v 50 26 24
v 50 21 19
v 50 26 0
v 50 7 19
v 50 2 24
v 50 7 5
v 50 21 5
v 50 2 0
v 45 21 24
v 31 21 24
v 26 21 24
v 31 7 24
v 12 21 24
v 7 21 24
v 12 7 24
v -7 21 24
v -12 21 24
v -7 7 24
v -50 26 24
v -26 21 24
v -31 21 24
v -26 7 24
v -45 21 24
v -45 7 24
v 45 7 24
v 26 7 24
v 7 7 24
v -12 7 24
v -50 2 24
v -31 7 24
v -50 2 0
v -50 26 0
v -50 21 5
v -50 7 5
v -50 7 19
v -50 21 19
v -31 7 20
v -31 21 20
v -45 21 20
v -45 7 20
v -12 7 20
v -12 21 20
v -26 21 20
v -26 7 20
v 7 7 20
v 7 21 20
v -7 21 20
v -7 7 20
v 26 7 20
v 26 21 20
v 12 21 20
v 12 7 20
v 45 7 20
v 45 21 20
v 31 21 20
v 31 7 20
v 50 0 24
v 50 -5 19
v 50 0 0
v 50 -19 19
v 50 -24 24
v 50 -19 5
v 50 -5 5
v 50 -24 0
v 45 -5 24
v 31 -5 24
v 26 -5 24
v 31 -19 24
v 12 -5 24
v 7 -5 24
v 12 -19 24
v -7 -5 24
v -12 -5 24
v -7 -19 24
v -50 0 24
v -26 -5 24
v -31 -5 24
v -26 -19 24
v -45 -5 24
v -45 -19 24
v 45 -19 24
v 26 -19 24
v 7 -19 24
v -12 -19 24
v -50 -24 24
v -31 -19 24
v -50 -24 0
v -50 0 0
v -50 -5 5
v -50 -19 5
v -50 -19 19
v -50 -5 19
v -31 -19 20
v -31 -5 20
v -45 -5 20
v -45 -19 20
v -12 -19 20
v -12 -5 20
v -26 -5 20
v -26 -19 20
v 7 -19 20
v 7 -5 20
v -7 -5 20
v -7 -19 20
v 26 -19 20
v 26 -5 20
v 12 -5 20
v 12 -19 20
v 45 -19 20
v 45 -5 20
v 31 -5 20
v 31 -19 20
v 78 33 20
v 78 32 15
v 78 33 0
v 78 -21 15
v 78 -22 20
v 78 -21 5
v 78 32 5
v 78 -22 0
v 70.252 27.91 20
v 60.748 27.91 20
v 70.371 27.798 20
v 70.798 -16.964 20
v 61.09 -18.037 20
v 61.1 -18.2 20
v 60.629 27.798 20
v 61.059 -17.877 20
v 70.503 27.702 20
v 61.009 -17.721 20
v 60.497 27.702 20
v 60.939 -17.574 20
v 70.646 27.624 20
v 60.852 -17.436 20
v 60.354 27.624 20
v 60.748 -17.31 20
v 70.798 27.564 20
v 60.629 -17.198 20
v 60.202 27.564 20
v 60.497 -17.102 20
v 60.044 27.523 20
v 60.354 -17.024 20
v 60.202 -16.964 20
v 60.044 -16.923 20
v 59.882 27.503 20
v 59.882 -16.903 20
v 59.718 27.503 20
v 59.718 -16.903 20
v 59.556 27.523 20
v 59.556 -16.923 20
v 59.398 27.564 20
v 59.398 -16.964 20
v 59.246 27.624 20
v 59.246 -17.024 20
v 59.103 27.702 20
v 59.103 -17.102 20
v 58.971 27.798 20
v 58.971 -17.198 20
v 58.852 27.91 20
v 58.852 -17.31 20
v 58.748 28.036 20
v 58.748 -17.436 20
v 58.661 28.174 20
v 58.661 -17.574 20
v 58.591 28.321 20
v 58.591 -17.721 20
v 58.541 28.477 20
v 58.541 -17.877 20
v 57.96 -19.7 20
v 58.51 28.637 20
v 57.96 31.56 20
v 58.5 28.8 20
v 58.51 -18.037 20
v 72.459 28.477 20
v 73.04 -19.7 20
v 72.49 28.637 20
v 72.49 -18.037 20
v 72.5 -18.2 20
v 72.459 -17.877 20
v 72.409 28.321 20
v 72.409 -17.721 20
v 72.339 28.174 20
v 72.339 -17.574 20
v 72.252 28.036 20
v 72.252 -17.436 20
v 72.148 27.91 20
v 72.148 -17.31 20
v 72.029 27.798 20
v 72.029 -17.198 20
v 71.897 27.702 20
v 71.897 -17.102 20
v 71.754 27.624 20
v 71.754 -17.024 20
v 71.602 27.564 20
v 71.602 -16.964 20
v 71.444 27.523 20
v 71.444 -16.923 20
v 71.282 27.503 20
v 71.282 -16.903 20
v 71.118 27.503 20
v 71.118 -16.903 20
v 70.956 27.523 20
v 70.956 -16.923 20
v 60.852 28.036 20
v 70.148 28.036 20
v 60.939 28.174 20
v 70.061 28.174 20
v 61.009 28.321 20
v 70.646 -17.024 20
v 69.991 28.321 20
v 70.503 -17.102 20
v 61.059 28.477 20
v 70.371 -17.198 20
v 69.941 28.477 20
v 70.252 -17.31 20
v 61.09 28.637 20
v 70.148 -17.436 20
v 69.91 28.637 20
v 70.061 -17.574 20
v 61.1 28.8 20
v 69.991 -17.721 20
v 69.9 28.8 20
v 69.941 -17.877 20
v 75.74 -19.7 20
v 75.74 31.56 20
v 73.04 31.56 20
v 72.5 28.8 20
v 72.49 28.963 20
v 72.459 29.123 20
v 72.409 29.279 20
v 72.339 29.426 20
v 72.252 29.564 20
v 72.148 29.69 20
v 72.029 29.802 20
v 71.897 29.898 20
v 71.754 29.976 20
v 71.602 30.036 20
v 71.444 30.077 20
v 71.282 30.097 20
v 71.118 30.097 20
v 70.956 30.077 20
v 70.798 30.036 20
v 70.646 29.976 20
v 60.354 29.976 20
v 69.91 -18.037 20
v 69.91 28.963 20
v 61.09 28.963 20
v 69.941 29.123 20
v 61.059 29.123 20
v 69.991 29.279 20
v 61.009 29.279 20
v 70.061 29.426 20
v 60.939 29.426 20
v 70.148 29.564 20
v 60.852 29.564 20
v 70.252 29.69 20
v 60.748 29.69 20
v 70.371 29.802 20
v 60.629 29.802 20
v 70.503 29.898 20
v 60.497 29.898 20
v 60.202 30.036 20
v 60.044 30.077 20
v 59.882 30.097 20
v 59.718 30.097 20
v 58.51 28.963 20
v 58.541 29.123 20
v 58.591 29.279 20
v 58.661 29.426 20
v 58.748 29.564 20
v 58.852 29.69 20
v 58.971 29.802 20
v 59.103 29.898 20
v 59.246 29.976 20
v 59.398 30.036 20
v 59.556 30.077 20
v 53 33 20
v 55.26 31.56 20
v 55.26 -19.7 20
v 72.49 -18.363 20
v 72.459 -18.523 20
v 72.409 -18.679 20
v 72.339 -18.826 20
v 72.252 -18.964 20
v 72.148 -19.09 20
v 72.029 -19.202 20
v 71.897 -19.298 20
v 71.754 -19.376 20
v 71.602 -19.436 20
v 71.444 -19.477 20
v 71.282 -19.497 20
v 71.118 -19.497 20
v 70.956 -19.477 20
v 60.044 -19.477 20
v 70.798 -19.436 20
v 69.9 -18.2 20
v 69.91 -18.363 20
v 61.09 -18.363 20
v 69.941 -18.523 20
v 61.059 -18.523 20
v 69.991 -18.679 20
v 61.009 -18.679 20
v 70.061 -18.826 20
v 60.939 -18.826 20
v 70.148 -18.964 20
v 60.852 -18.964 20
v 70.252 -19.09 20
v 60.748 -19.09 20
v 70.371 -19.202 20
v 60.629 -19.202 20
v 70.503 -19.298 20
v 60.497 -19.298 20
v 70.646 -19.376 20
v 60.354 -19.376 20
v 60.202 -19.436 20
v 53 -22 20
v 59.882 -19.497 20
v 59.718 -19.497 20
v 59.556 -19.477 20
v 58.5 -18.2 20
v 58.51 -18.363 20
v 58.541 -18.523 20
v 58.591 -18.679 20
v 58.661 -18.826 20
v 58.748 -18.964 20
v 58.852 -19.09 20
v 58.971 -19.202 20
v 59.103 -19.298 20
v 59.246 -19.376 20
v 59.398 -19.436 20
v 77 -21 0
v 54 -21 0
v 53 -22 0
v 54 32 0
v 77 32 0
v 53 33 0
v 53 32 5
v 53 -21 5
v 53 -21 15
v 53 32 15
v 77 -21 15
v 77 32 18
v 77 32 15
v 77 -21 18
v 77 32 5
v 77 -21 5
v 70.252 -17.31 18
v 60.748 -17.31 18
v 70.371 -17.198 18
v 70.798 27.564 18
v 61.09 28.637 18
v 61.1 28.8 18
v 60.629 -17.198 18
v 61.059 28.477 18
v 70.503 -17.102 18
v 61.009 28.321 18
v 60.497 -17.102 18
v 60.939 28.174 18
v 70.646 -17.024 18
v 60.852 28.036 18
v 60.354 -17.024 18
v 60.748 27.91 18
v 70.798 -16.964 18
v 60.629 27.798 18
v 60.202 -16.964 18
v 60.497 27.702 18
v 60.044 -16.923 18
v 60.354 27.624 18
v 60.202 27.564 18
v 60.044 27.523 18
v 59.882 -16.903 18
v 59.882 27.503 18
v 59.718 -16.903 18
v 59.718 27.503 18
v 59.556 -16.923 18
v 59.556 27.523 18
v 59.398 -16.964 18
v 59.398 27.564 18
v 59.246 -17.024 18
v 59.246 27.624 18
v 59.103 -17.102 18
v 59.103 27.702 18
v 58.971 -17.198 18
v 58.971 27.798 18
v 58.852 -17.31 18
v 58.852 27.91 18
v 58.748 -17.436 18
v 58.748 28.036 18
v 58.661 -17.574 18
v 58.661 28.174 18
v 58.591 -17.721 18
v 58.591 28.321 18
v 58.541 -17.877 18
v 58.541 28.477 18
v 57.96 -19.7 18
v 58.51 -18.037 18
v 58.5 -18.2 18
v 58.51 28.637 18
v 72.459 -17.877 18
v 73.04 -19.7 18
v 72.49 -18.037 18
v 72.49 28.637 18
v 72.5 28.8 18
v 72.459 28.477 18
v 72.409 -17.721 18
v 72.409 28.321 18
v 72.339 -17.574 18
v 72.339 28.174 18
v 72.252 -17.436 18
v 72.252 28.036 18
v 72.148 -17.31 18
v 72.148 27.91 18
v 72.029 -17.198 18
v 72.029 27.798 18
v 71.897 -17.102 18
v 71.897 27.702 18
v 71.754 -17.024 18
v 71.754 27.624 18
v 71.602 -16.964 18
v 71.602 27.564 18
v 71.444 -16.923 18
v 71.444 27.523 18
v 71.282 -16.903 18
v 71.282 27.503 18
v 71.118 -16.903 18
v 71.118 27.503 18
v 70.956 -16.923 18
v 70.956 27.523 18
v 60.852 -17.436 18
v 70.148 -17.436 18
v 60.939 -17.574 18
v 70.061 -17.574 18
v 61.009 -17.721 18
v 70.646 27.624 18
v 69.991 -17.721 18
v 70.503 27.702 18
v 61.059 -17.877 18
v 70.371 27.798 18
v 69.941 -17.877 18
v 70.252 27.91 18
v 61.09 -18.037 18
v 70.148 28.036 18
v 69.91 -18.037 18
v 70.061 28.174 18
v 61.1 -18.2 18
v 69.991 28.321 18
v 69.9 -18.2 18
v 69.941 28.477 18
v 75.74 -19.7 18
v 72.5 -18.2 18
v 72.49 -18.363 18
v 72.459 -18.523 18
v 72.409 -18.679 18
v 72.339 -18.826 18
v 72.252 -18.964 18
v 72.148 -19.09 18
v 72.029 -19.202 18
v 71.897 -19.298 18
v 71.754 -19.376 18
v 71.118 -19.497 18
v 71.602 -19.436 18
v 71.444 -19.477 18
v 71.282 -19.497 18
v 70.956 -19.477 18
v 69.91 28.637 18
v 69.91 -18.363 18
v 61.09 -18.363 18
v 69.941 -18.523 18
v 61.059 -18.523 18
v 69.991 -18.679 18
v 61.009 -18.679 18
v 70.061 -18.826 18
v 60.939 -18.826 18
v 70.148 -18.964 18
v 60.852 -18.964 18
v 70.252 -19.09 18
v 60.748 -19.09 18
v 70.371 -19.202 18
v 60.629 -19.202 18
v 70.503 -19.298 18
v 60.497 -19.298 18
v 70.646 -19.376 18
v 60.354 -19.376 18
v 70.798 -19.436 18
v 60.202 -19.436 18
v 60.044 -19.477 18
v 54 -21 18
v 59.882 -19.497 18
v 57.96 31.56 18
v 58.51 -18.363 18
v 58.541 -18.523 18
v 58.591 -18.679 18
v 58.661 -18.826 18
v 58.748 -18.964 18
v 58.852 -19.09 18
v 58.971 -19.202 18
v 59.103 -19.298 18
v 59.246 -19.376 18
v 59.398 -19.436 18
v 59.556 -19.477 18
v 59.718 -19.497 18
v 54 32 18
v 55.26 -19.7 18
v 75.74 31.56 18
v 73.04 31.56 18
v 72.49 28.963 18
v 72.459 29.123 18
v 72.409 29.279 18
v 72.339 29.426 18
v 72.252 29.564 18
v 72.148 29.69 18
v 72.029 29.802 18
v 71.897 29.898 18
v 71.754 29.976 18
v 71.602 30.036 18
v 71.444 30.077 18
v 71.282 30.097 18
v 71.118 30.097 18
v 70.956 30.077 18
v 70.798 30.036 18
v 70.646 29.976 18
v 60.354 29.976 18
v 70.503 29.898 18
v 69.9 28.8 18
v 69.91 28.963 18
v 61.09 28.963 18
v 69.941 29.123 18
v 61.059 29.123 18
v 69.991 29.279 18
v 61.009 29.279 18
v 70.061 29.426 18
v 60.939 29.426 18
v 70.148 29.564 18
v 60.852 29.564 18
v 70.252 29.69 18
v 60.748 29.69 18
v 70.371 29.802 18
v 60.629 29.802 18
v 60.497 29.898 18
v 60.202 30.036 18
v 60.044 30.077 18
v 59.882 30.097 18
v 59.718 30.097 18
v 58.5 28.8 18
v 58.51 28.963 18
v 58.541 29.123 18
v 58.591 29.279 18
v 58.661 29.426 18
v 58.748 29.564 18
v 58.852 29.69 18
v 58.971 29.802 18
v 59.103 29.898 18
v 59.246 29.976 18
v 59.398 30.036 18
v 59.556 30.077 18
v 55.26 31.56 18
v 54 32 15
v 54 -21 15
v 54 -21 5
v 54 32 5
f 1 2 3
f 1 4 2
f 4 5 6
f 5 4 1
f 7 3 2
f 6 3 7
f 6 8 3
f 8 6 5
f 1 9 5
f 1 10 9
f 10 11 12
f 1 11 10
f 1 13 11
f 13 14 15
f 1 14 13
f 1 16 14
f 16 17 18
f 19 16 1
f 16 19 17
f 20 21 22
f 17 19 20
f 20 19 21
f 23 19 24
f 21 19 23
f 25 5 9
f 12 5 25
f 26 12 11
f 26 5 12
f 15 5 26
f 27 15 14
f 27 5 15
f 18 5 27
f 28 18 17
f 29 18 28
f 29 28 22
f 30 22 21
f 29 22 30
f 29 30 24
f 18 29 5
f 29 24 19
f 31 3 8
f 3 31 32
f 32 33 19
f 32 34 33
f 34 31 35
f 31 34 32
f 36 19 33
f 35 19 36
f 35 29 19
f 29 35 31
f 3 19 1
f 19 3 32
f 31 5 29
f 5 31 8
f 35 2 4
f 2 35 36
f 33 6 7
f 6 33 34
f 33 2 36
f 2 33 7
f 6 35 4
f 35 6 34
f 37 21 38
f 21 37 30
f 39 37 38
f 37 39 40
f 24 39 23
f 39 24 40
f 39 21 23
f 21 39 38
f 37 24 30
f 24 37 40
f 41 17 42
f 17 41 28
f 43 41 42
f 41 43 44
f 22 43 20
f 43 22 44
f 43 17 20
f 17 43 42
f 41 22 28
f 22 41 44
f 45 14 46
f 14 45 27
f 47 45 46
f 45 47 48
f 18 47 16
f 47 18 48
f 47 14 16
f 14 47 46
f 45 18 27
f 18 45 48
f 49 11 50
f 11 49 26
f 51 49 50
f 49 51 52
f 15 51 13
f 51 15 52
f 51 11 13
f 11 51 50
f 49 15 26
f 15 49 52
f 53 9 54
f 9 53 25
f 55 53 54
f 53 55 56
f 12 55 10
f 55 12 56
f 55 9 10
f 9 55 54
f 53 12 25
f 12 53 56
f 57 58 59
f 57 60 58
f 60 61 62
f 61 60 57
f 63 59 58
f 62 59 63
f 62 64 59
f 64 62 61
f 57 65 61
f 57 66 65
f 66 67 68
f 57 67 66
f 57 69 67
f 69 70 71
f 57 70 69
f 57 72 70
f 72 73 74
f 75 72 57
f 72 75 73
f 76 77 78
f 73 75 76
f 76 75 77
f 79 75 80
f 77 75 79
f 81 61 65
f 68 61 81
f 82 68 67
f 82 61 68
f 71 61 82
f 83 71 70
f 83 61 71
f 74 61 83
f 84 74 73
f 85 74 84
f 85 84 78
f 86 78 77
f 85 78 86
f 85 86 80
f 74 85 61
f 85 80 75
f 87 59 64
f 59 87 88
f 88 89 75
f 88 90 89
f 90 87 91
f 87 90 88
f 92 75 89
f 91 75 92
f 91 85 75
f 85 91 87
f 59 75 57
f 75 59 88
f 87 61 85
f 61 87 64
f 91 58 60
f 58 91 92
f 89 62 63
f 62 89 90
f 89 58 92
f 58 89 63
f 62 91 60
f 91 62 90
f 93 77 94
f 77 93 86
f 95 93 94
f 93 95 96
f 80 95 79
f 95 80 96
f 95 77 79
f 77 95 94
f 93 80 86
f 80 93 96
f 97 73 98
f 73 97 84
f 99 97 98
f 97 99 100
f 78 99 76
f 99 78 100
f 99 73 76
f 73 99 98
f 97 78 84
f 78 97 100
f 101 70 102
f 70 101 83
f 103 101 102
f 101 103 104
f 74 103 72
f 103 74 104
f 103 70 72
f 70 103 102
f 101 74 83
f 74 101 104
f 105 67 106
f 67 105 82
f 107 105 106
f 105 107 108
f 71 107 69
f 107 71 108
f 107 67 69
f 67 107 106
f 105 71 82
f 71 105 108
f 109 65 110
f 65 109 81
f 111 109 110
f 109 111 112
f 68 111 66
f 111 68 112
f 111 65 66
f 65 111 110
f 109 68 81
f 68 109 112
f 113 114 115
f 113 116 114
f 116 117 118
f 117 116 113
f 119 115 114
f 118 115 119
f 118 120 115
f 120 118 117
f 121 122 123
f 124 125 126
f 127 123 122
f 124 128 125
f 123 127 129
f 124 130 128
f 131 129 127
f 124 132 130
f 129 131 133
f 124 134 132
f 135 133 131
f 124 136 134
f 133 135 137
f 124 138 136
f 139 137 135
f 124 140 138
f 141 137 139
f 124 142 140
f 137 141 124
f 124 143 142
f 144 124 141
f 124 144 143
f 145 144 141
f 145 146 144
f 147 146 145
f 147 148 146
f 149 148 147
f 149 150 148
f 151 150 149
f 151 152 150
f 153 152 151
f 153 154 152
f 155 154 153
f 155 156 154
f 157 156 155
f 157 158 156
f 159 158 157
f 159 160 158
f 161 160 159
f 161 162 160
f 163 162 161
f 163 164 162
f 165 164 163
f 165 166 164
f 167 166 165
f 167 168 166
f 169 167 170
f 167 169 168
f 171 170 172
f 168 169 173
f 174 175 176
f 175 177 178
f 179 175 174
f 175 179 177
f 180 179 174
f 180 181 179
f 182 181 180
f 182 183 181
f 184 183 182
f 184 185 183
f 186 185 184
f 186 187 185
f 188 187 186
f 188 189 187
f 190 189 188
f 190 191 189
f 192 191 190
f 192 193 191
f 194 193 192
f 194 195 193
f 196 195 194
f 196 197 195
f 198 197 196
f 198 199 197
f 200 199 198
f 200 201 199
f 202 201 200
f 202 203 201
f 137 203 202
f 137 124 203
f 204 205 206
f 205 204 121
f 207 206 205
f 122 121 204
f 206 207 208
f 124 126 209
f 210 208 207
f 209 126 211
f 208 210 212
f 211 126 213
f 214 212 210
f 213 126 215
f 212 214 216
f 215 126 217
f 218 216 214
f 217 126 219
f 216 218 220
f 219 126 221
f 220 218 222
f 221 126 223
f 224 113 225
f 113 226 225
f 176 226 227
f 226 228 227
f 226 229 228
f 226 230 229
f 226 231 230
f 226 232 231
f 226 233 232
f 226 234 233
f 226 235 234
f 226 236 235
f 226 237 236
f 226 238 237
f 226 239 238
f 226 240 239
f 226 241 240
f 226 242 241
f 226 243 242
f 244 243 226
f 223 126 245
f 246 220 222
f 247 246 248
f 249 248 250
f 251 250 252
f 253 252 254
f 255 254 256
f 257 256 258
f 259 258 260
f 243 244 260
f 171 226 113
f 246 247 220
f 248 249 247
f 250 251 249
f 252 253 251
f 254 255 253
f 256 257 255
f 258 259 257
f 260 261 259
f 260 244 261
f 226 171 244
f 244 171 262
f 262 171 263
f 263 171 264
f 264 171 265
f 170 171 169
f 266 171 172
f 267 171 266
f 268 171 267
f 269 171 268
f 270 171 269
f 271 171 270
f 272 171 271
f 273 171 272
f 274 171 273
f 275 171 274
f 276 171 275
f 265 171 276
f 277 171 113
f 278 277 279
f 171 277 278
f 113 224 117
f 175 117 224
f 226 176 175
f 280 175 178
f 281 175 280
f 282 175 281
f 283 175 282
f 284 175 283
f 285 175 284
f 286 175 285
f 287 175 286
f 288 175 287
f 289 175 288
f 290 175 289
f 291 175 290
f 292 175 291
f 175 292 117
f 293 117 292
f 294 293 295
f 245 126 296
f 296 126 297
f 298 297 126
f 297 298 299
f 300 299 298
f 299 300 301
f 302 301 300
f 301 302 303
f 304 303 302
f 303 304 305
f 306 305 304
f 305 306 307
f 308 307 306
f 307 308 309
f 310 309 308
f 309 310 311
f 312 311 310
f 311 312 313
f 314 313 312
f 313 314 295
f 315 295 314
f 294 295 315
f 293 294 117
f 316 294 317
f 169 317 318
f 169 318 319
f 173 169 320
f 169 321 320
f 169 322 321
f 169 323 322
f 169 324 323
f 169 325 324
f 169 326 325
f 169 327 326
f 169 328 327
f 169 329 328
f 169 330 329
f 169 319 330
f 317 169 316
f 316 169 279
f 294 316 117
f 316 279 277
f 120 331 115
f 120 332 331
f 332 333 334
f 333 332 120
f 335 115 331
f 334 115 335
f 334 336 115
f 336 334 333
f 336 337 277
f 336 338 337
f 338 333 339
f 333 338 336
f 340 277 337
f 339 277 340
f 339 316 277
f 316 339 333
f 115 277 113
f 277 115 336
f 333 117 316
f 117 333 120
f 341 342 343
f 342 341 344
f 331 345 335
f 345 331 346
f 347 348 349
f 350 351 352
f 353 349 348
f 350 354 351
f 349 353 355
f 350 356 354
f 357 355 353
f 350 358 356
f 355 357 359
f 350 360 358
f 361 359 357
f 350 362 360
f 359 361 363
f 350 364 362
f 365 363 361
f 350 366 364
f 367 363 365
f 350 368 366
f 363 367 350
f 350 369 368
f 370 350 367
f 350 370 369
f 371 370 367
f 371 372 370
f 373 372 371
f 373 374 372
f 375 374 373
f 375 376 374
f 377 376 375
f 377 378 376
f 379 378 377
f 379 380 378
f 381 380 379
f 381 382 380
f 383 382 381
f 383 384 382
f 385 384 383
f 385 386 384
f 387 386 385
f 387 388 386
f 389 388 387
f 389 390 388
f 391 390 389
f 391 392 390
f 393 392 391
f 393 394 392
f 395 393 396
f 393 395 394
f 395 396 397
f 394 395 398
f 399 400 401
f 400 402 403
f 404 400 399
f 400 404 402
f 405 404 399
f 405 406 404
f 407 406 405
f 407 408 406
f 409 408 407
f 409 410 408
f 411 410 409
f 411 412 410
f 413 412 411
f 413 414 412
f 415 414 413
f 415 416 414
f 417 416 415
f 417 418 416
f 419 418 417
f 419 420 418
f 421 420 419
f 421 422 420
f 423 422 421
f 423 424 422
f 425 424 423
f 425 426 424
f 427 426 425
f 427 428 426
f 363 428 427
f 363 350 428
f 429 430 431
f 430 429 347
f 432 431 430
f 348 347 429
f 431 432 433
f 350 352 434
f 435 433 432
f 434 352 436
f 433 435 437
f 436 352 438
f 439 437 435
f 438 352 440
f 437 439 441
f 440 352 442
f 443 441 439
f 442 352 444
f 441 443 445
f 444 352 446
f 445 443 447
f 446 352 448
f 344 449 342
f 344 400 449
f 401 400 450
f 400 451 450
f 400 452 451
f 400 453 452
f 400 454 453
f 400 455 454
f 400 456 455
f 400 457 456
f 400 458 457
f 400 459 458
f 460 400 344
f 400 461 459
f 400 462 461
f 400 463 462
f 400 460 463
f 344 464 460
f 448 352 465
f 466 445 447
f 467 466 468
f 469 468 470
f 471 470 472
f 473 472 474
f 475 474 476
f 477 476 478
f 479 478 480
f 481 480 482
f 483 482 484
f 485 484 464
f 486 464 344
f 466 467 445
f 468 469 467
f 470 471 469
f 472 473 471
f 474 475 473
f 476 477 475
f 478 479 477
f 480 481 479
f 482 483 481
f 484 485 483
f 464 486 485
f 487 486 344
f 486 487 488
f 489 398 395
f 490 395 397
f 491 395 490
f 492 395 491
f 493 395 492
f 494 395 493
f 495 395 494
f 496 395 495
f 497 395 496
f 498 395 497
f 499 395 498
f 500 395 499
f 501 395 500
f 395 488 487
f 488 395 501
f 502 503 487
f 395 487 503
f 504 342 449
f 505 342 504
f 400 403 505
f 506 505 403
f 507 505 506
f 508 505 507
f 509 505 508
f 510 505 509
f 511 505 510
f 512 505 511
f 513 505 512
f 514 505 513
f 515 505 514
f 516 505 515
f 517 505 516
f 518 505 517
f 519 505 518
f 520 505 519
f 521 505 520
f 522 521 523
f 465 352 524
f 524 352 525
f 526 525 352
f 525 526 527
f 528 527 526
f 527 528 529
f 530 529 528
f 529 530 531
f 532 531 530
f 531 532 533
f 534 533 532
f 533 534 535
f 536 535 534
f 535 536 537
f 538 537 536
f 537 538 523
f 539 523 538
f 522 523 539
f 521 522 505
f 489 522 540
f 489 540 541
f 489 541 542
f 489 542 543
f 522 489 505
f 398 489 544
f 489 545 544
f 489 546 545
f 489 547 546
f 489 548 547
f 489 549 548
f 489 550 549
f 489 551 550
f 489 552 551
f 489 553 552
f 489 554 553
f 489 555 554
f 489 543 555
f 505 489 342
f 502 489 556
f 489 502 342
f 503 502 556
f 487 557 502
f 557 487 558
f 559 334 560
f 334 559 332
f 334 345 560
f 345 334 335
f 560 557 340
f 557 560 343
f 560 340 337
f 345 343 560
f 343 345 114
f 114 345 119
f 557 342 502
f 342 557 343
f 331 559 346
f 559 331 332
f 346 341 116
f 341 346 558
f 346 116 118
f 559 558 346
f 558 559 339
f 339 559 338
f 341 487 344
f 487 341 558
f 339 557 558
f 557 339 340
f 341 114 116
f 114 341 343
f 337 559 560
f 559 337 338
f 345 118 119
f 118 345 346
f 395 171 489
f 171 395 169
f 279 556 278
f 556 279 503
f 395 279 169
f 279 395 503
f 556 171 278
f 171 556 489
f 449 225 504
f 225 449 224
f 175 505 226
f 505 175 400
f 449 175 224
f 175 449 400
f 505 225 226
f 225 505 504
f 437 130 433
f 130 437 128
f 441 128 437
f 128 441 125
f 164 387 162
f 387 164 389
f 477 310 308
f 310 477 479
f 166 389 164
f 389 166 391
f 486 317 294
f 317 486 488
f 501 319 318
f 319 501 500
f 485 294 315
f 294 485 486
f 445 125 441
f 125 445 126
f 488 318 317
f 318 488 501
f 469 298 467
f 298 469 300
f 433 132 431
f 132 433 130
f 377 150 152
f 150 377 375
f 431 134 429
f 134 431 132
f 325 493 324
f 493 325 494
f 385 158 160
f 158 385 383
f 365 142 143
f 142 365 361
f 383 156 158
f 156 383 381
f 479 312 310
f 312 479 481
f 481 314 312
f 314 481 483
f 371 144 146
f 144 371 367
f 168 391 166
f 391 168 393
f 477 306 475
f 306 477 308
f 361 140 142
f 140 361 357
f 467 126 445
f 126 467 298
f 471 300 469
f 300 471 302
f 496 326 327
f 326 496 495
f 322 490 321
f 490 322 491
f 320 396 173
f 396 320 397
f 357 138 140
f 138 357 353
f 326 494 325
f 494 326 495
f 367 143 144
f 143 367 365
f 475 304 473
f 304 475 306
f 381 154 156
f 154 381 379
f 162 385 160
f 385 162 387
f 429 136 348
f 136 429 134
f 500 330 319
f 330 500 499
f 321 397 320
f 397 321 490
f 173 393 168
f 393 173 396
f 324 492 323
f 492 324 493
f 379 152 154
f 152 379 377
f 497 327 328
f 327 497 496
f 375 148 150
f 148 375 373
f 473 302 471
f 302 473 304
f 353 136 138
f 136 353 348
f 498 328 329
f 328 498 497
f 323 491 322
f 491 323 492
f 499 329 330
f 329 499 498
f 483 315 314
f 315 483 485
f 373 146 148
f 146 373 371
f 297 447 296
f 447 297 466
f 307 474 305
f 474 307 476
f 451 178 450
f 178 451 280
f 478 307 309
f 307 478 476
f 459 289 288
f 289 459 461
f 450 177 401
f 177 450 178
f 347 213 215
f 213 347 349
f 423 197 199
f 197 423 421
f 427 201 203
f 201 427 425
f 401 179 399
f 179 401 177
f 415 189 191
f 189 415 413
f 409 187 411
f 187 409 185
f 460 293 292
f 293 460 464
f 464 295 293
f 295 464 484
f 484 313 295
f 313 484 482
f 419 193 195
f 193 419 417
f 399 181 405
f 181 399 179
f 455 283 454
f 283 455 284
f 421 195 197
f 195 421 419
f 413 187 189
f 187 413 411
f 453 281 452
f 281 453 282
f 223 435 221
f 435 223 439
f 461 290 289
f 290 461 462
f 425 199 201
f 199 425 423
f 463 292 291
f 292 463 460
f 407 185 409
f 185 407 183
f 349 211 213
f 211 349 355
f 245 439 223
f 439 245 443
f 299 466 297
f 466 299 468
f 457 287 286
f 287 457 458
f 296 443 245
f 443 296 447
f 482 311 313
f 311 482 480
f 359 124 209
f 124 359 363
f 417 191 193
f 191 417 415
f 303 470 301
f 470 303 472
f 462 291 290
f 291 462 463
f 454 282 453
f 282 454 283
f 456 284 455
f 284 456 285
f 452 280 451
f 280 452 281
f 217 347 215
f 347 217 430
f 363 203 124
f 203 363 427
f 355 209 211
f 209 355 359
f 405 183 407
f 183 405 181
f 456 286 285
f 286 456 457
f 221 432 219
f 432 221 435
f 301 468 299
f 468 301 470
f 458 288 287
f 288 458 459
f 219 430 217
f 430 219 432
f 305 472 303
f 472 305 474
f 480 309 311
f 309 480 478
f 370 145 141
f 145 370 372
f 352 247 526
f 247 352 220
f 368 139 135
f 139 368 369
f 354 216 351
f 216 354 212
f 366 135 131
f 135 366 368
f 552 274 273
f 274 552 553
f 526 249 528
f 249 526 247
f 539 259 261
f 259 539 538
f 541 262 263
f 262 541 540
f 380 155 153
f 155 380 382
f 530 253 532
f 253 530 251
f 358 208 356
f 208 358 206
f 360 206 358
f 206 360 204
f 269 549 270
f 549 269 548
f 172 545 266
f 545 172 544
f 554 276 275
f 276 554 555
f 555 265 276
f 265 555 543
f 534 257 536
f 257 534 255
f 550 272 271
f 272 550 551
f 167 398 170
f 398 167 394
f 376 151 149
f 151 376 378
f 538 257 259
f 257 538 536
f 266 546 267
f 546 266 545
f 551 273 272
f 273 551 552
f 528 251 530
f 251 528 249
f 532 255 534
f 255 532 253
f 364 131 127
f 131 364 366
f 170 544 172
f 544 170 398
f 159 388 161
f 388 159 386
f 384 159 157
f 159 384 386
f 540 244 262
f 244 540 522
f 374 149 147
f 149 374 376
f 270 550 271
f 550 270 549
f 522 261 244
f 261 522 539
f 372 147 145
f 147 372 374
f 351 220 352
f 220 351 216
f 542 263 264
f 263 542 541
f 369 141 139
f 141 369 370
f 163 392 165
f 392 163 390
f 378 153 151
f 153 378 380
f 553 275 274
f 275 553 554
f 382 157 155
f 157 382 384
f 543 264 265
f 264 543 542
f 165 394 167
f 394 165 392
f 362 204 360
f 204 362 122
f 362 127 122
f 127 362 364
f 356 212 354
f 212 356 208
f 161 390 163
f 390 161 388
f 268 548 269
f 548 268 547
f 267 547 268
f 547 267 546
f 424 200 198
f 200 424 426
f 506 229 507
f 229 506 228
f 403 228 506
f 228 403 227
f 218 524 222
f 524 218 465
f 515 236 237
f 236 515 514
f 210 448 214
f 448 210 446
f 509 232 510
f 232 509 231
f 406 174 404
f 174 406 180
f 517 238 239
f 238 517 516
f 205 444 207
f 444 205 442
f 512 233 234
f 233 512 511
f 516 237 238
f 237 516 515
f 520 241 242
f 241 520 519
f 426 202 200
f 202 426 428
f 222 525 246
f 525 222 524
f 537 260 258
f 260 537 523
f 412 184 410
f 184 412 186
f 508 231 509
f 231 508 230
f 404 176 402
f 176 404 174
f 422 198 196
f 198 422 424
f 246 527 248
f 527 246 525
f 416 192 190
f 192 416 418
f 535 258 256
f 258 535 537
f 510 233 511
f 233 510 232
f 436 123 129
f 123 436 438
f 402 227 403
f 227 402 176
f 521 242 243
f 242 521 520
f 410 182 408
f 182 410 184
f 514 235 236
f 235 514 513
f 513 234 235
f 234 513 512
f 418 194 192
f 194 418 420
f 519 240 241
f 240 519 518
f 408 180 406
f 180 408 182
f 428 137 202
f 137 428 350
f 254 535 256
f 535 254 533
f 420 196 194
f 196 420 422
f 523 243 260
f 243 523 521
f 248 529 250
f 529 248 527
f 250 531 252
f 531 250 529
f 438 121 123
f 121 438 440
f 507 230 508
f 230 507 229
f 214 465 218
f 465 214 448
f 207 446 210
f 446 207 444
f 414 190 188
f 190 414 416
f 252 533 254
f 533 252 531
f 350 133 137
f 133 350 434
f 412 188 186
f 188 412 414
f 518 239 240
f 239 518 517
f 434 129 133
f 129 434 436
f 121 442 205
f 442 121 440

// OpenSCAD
// file: ../v3/params.scad
hole_cube_width = 14;
hole_distance = 5;
cylinder_fn = 50;

number_of_rows = 3;
number_of_columns = 5;

hole_positions = [
    for (row=[1:number_of_rows])
        for (x=[0:(number_of_columns-1)]) [
            x*hole_cube_width + x*hole_distance,
            (row * (hole_distance + hole_cube_width)),
            0
        ]
];

keyboard_width = hole_distance + (hole_cube_width + hole_distance)*number_of_columns + 21 + hole_distance;
keyboard_depth = hole_distance + (hole_cube_width + hole_distance)*number_of_rows;

bottom_plate_height = 0.7;
middle_plate_height=0.7;
top_plate_height=0.7;

screw_hole_radius = 1.2;
nut_hole_radius = 2.3;
nut_hole_mesh_radius = 4;

metal_pin_locations = [
    [3.2, 9.5, 0],
    [9.5, 12.1, 0]
];
metal_pin_radius = 0.8;

plastic_pin_locations = [
    [1.9, 7, 0],
    [12.1, 7, 0]
];
plastic_pin_radius = 0.9;

central_pin_location = [7, 7, 0];
central_pin_radius = 2.05;

bottom_lid_height = 2;

chip_pin_socket_mesh_depth = 2.2+((2.54-2.2)/2)+0.05; //0.05 to overlap
chip_pin_socket_mesh_width = 7;
chip_pin_socket_mesh_height = 4; // 6 mm long pins below the board holder
chip_pin_socket_hole_radius = 0.5+0.3+0.1;
chip_pin_socket_pitch = 2.54;

pin_socket_number_of_pins_in_a_row = 20;
first_pin_socket_pin_depth = hole_distance+0.8;
first_pin_socket_pin_width = hole_distance + (hole_cube_width + hole_distance)*number_of_columns+1.61;
second_pin_socket_pin_depth = first_pin_socket_pin_depth; //+17.78;
second_pin_socket_pin_width = hole_distance + (hole_cube_width + hole_distance)*number_of_columns+1.61+17.78;

first_row_pin_socket_pin_center_locations = [
    for (x=[0:pin_socket_number_of_pins_in_a_row-1]) [
        first_pin_socket_pin_width,
        first_pin_socket_pin_depth + x*chip_pin_socket_pitch,
        0
    ]
];

second_row_pin_socket_pin_center_locations = [
    for (x=[0:pin_socket_number_of_pins_in_a_row-1]) [
        second_pin_socket_pin_width,
        second_pin_socket_pin_depth + x*chip_pin_socket_pitch,
        0
    ]
];

gpio_holding_screw_locations = [
    [
        hole_distance + (hole_cube_width + hole_distance)*number_of_columns+4.8,
        hole_distance+0.8,
        0
    ],
    [
        hole_distance + (hole_cube_width + hole_distance)*number_of_columns+4.8+11.4,
        hole_distance+0.8,
        0
    ],
    [
        hole_distance + (hole_cube_width + hole_distance)*number_of_columns+4.8,
        hole_distance+0.8+47,
        0
    ],
    [
        hole_distance + (hole_cube_width + hole_distance)*number_of_columns+4.8+11.4,
        hole_distance+0.8+47,
        0
    ]
];
// file: ../v3/modules/gpio_socket.scad
include <../params.scad>;


// gpio socket
module gpio_pin_socket() {
    for (location=first_row_pin_socket_pin_center_locations) {
        translate(location) {
            // cylinder(h=middle_plate_height+top_plate_height+5, r=chip_pin_socket_hole_radius, $fn=cylinder_fn);
            cube([2.7, 3, middle_plate_height+top_plate_height+40], center=true);
            translate([0, -0.45, -0.1]) {
                cube([3, 1, 2.1]);
            };
        };
    };
    for (location=second_row_pin_socket_pin_center_locations) {
        translate(location) {
            cube([2.7, 3, middle_plate_height+top_plate_height+40], center=true);
            // cylinder(h=middle_plate_height+top_plate_height+5, r=chip_pin_socket_hole_radius, $fn=cylinder_fn);
        };
    };
    for (location=gpio_holding_screw_locations) {
        translate(location) {
            cylinder(h=40, r=screw_hole_radius+0.1, $fn=cylinder_fn);
        }
    }
};

module bolt() {
    cylinder(h=1, r=screw_hole_radius+0.3, $fn=cylinder_fn);
    cylinder(h=10, r=screw_hole_radius, $fn=cylinder_fn);
}
// main file
include <../v3/modules/gpio_socket.scad>

hole_edge = 14;
hole_distance = 5;

length =  5*(hole_edge+hole_distance) + hole_distance;
depth = hole_edge + 2*hole_distance;
height = hole_edge + 2*hole_distance;


module stick() {
	difference() {
		difference() {
			cube([length, depth, height]);
			translate([-2, hole_distance, hole_distance]) {
				cube([length+4, hole_edge, hole_edge]);
			};
		};
		union() {
			translate([hole_distance, hole_distance, 20]) {
				cube([hole_edge, hole_edge, 10]);
			};
			translate([(hole_distance+hole_edge)+hole_distance, hole_distance, 20]) {
				cube([hole_edge, hole_edge, 10]);
			};
			translate([2*(hole_distance+hole_edge)+hole_distance, hole_distance, 20]) {
				cube([hole_edge, hole_edge, 10]);
			};
			translate([3*(hole_distance+hole_edge)+hole_distance, hole_distance, 20]) {
				cube([hole_edge, hole_edge, 10]);
			};
			translate([4*(hole_distance+hole_edge)+hole_distance, hole_distance, 20]) {
				cube([hole_edge, hole_edge, 10]);
			};
		};
	};
};


module board_case() {
	difference() {
		translate([length-2, 2, 0]) {
			difference() {
				cube([25, 55, 20]);
				translate([1, 1, -2]) {
					cube([25-2, 55-2, 20]);
				};
				translate([0, 1, 5]) {
					cube([90, 55-2, 10]);
				};
			};
		};
		gpio_pin_socket();
	};
};


translate([-length/2, 2, 0]) {
	stick();
};
translate([-length/2, -depth, 0]) {
	stick();
};

translate([-length/2 + 5, -depth, 0]) {
	board_case();
}
